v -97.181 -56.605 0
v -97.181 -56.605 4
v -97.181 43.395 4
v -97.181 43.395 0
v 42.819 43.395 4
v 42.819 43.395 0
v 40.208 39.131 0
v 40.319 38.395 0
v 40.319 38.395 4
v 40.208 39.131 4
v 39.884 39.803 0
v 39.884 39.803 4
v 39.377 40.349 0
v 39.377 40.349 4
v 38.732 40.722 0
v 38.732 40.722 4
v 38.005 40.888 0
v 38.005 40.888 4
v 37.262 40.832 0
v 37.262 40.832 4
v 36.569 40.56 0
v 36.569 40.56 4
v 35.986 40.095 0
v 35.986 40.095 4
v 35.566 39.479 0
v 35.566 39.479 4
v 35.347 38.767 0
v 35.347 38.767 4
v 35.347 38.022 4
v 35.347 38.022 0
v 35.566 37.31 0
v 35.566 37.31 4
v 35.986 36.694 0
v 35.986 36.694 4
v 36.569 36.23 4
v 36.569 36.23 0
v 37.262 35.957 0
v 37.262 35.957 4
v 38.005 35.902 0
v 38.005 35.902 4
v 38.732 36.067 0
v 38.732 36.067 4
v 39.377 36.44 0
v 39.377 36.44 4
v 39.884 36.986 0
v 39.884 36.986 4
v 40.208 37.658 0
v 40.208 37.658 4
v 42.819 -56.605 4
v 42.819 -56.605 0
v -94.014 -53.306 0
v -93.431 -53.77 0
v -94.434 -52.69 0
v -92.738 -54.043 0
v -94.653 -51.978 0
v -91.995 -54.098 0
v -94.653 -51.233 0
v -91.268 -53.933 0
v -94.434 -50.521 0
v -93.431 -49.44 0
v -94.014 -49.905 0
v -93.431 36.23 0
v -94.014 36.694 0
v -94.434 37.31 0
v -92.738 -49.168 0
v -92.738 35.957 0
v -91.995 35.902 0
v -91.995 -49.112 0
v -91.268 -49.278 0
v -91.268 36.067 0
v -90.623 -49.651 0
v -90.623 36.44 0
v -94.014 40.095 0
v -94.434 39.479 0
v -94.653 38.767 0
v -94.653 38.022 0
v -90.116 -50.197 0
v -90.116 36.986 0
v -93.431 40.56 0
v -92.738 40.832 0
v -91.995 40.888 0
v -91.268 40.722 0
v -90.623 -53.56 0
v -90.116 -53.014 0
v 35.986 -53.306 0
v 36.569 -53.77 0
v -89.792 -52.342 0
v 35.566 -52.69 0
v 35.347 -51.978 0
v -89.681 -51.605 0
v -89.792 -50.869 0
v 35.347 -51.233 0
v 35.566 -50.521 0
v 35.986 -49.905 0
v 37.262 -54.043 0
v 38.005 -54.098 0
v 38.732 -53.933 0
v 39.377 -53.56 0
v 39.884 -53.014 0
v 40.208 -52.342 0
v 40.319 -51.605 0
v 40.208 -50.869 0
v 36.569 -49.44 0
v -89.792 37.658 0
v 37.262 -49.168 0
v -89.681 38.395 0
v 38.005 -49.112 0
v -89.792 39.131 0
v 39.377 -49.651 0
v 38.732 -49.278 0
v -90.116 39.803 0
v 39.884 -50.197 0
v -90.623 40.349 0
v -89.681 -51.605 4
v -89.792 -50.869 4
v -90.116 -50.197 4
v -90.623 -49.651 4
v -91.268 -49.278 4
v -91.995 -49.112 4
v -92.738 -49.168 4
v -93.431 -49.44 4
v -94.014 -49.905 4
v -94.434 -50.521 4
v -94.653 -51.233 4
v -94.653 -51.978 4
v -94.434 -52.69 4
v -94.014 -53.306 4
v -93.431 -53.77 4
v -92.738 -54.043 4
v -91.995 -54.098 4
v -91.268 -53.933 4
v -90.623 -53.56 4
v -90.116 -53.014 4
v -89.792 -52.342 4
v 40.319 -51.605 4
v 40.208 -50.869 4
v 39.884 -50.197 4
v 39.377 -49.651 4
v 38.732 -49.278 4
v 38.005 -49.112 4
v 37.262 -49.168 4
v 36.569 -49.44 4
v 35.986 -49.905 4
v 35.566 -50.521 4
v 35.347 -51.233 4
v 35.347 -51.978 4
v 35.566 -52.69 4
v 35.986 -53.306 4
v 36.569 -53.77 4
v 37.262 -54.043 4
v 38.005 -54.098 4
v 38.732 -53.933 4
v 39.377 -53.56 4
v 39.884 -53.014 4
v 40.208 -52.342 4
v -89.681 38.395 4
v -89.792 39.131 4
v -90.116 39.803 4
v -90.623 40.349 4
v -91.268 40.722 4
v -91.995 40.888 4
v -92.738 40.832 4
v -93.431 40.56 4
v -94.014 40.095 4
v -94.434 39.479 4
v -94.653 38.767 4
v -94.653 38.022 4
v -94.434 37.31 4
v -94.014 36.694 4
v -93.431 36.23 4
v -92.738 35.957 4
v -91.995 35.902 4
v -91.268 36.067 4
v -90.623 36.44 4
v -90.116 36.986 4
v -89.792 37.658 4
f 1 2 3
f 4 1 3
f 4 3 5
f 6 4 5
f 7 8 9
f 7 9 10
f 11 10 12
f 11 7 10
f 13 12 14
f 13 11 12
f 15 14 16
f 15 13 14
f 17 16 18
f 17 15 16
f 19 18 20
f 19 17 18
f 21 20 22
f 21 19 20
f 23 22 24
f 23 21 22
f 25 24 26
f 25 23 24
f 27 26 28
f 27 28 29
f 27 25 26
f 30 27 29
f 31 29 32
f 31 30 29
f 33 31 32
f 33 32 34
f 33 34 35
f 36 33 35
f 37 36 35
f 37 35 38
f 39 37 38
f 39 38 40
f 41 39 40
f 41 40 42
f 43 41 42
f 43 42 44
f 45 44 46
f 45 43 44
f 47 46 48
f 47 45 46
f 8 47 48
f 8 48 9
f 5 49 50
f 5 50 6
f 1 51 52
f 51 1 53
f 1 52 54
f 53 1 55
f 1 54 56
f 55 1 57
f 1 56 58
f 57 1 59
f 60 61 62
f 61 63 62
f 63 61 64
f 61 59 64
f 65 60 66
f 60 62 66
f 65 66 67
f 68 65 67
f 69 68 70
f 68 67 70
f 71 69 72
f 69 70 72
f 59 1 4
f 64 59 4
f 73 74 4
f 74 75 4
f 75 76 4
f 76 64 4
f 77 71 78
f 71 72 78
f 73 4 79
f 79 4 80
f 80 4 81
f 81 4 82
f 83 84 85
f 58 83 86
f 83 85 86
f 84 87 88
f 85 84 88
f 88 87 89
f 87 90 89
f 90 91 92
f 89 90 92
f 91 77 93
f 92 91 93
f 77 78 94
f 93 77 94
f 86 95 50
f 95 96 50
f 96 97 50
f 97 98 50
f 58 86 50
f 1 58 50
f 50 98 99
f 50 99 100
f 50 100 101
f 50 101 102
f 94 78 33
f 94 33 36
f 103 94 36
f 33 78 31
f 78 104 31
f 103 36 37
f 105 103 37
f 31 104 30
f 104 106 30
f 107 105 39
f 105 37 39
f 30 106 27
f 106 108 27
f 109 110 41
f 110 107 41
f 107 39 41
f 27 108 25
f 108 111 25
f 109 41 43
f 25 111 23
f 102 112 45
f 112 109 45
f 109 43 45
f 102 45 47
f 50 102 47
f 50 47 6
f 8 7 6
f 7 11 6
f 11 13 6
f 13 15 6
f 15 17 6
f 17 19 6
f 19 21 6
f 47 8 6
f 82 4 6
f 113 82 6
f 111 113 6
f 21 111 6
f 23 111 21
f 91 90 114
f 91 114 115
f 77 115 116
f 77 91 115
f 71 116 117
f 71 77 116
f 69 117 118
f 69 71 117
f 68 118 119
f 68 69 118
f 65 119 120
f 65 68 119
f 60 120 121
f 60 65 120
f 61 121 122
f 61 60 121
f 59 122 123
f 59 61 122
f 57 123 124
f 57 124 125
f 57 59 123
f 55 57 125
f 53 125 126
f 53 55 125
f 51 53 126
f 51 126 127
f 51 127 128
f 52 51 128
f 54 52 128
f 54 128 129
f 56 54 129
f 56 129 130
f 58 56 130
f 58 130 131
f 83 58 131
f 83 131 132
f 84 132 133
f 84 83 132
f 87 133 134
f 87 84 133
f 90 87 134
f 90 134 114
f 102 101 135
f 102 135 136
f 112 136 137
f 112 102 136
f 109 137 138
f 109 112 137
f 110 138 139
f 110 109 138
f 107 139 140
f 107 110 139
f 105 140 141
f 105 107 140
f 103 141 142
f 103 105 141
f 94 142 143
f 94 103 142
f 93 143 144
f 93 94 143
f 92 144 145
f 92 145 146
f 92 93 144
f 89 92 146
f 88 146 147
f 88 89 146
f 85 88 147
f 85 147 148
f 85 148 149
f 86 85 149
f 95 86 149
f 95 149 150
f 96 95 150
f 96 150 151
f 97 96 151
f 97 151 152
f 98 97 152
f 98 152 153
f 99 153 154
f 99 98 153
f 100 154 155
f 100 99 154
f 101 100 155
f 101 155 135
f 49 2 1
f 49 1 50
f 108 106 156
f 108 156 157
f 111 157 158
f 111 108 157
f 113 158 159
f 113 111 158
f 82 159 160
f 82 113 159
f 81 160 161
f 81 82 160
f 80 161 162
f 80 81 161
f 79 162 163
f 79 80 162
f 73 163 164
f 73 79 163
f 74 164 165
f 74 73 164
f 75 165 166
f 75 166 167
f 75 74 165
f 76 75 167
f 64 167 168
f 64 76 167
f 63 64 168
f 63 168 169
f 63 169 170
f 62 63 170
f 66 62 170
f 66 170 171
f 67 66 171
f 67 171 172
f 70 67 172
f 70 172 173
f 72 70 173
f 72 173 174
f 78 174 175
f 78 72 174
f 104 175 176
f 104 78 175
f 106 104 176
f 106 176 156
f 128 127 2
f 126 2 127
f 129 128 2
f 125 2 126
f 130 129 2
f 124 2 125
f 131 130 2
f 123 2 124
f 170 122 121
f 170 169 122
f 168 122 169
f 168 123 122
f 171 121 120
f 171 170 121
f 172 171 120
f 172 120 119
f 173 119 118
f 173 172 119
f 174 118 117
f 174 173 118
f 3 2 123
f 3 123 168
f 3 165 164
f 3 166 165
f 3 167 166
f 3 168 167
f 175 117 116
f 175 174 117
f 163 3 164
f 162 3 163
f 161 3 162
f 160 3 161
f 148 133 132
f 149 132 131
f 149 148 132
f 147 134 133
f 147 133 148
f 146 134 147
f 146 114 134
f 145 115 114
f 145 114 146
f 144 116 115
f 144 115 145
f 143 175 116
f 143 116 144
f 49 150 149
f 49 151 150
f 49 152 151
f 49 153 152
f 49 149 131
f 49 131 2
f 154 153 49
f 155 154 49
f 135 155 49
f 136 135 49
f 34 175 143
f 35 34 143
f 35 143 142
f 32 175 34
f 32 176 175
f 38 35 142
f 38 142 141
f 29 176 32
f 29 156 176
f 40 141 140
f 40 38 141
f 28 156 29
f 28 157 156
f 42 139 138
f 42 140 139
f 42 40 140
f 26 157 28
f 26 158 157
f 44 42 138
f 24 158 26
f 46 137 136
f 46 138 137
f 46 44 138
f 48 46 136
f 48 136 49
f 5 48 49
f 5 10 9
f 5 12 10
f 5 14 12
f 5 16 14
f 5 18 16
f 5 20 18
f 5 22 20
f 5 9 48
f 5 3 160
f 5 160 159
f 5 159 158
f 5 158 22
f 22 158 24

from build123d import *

# Parameters (mm, degrees)
SKETCH1_W           = 142
SKETCH1_H           = 102
SKETCH1_R           = 2.5
BOSS_EXTRUDE1_DEPTH = 4
SKETCH2_W           = 142
SKETCH2_H           = 102
SKETCH2_W_2         = 140
SKETCH2_H_2         = 100
CUT_EXTRUDE1_DEPTH  = 5


with BuildPart() as part:
    # Sketch1 → Boss-Extrude1 (new body)
    with BuildSketch(Plane.XY):
        with Locations((-27.181372549, -6.605392157)):
            Rectangle(SKETCH1_W, SKETCH1_H)
        with Locations((-92.181372549, 38.394607843)):
            Circle(SKETCH1_R, mode=Mode.SUBTRACT)
        with Locations((37.818627451, 38.394607843)):
            Circle(SKETCH1_R, mode=Mode.SUBTRACT)
        with Locations((37.818627451, -51.605392157)):
            Circle(SKETCH1_R, mode=Mode.SUBTRACT)
        with Locations((-92.181372549, -51.605392157)):
            Circle(SKETCH1_R, mode=Mode.SUBTRACT)
    extrude(amount=BOSS_EXTRUDE1_DEPTH)

    # Sketch2 → Cut-Extrude1 (cut, through all)
    with BuildSketch(Plane.XY.offset(4)):
        with Locations((-27.181372549, -6.605392157)):
            Rectangle(SKETCH2_W, SKETCH2_H)
        with Locations((-27.181372549, -6.605392157)):
            Rectangle(SKETCH2_W_2, SKETCH2_H_2, mode=Mode.SUBTRACT)
    extrude(amount=-CUT_EXTRUDE1_DEPTH, mode=Mode.SUBTRACT)


solid = part.part
